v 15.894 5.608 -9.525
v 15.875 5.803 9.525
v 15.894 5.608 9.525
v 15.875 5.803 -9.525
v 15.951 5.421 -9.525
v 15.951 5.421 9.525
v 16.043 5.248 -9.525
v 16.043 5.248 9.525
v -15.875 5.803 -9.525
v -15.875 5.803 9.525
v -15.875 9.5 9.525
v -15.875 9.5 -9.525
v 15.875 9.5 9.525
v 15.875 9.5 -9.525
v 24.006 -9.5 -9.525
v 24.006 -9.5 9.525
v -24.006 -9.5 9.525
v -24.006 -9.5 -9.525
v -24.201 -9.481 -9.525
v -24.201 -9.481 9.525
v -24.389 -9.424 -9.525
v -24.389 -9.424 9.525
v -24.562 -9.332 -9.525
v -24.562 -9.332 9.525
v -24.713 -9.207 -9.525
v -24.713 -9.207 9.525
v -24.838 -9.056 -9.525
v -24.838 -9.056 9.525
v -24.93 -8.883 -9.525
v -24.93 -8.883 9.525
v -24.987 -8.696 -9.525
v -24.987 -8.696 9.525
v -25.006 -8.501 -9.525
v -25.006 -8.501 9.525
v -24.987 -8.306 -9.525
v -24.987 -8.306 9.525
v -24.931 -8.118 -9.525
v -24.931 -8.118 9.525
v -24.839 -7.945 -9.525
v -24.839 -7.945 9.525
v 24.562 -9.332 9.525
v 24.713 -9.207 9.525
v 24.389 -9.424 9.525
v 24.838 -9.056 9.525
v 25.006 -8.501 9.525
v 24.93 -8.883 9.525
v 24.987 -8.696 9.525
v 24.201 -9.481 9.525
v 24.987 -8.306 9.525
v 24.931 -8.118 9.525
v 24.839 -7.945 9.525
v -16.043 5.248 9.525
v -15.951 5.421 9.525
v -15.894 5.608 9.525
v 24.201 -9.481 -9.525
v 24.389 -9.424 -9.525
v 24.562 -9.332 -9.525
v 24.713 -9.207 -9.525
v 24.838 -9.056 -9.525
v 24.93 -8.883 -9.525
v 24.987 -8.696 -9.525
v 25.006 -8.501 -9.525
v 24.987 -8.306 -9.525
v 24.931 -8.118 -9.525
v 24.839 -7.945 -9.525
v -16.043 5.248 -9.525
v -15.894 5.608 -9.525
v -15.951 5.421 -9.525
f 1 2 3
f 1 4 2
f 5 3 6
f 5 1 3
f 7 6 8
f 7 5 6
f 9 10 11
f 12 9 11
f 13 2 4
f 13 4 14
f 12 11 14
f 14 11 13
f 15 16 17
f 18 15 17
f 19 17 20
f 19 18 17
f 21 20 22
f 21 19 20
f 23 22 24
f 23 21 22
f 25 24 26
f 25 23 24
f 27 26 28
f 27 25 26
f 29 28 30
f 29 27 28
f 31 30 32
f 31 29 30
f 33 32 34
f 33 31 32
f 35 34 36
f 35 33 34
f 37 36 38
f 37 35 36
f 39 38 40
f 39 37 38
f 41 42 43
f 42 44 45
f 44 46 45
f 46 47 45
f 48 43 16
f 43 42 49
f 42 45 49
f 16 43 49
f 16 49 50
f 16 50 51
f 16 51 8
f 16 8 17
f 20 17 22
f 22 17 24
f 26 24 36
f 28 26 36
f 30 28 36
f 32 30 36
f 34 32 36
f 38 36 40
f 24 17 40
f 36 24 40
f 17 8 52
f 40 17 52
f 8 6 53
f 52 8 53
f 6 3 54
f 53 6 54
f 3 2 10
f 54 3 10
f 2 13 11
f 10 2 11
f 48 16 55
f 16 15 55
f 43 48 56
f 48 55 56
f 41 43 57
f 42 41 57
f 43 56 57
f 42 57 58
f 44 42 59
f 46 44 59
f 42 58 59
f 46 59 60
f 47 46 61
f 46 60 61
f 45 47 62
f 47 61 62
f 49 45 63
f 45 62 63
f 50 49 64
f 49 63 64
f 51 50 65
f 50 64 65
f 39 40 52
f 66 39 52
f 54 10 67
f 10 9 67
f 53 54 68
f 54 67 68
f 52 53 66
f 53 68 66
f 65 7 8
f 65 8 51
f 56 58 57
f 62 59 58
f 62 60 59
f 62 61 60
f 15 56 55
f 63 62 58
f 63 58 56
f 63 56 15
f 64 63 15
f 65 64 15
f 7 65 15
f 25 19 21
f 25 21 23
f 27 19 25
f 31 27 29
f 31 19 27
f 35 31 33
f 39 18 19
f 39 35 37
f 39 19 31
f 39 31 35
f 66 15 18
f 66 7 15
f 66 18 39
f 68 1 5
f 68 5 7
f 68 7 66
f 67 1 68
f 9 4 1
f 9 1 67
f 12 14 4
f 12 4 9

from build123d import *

# Parameters (mm, degrees)
SKETCH1_W           = 31.75
SKETCH1_H           = 19
BOSS_EXTRUDE1_DEPTH = 9.525
BOSS_EXTRUDE2_DEPTH = 19.05
FILLET5_R           = 1


with BuildPart() as part:
    # Sketch1 → Boss-Extrude1 (new body, symmetric)
    with BuildSketch(Plane.XY):
        Rectangle(SKETCH1_W, SKETCH1_H)
    extrude(amount=BOSS_EXTRUDE1_DEPTH, both=True)

    # Sketch3 → Boss-Extrude2 (add)
    with BuildSketch(Plane.XY.offset(9.525)):
        Polygon((-15.875, -9.5), (-25.875, -9.5), (-15.875, 5.5), align=None)
        Polygon((15.875, -9.5), (15.875, 5.5), (25.875, -9.5), align=None)
    extrude(amount=-BOSS_EXTRUDE2_DEPTH)

    # Fillet5
    fillet5_edges = [part.edges().sort_by_distance(p)[0] for p in [
        (-25.875, -9.5, 0),
        (-15.875, 5.5, 0),
        (15.875, 5.5, 0),
        (25.875, -9.5, 0),
    ]]
    fillet(fillet5_edges, radius=FILLET5_R)


solid = part.part
